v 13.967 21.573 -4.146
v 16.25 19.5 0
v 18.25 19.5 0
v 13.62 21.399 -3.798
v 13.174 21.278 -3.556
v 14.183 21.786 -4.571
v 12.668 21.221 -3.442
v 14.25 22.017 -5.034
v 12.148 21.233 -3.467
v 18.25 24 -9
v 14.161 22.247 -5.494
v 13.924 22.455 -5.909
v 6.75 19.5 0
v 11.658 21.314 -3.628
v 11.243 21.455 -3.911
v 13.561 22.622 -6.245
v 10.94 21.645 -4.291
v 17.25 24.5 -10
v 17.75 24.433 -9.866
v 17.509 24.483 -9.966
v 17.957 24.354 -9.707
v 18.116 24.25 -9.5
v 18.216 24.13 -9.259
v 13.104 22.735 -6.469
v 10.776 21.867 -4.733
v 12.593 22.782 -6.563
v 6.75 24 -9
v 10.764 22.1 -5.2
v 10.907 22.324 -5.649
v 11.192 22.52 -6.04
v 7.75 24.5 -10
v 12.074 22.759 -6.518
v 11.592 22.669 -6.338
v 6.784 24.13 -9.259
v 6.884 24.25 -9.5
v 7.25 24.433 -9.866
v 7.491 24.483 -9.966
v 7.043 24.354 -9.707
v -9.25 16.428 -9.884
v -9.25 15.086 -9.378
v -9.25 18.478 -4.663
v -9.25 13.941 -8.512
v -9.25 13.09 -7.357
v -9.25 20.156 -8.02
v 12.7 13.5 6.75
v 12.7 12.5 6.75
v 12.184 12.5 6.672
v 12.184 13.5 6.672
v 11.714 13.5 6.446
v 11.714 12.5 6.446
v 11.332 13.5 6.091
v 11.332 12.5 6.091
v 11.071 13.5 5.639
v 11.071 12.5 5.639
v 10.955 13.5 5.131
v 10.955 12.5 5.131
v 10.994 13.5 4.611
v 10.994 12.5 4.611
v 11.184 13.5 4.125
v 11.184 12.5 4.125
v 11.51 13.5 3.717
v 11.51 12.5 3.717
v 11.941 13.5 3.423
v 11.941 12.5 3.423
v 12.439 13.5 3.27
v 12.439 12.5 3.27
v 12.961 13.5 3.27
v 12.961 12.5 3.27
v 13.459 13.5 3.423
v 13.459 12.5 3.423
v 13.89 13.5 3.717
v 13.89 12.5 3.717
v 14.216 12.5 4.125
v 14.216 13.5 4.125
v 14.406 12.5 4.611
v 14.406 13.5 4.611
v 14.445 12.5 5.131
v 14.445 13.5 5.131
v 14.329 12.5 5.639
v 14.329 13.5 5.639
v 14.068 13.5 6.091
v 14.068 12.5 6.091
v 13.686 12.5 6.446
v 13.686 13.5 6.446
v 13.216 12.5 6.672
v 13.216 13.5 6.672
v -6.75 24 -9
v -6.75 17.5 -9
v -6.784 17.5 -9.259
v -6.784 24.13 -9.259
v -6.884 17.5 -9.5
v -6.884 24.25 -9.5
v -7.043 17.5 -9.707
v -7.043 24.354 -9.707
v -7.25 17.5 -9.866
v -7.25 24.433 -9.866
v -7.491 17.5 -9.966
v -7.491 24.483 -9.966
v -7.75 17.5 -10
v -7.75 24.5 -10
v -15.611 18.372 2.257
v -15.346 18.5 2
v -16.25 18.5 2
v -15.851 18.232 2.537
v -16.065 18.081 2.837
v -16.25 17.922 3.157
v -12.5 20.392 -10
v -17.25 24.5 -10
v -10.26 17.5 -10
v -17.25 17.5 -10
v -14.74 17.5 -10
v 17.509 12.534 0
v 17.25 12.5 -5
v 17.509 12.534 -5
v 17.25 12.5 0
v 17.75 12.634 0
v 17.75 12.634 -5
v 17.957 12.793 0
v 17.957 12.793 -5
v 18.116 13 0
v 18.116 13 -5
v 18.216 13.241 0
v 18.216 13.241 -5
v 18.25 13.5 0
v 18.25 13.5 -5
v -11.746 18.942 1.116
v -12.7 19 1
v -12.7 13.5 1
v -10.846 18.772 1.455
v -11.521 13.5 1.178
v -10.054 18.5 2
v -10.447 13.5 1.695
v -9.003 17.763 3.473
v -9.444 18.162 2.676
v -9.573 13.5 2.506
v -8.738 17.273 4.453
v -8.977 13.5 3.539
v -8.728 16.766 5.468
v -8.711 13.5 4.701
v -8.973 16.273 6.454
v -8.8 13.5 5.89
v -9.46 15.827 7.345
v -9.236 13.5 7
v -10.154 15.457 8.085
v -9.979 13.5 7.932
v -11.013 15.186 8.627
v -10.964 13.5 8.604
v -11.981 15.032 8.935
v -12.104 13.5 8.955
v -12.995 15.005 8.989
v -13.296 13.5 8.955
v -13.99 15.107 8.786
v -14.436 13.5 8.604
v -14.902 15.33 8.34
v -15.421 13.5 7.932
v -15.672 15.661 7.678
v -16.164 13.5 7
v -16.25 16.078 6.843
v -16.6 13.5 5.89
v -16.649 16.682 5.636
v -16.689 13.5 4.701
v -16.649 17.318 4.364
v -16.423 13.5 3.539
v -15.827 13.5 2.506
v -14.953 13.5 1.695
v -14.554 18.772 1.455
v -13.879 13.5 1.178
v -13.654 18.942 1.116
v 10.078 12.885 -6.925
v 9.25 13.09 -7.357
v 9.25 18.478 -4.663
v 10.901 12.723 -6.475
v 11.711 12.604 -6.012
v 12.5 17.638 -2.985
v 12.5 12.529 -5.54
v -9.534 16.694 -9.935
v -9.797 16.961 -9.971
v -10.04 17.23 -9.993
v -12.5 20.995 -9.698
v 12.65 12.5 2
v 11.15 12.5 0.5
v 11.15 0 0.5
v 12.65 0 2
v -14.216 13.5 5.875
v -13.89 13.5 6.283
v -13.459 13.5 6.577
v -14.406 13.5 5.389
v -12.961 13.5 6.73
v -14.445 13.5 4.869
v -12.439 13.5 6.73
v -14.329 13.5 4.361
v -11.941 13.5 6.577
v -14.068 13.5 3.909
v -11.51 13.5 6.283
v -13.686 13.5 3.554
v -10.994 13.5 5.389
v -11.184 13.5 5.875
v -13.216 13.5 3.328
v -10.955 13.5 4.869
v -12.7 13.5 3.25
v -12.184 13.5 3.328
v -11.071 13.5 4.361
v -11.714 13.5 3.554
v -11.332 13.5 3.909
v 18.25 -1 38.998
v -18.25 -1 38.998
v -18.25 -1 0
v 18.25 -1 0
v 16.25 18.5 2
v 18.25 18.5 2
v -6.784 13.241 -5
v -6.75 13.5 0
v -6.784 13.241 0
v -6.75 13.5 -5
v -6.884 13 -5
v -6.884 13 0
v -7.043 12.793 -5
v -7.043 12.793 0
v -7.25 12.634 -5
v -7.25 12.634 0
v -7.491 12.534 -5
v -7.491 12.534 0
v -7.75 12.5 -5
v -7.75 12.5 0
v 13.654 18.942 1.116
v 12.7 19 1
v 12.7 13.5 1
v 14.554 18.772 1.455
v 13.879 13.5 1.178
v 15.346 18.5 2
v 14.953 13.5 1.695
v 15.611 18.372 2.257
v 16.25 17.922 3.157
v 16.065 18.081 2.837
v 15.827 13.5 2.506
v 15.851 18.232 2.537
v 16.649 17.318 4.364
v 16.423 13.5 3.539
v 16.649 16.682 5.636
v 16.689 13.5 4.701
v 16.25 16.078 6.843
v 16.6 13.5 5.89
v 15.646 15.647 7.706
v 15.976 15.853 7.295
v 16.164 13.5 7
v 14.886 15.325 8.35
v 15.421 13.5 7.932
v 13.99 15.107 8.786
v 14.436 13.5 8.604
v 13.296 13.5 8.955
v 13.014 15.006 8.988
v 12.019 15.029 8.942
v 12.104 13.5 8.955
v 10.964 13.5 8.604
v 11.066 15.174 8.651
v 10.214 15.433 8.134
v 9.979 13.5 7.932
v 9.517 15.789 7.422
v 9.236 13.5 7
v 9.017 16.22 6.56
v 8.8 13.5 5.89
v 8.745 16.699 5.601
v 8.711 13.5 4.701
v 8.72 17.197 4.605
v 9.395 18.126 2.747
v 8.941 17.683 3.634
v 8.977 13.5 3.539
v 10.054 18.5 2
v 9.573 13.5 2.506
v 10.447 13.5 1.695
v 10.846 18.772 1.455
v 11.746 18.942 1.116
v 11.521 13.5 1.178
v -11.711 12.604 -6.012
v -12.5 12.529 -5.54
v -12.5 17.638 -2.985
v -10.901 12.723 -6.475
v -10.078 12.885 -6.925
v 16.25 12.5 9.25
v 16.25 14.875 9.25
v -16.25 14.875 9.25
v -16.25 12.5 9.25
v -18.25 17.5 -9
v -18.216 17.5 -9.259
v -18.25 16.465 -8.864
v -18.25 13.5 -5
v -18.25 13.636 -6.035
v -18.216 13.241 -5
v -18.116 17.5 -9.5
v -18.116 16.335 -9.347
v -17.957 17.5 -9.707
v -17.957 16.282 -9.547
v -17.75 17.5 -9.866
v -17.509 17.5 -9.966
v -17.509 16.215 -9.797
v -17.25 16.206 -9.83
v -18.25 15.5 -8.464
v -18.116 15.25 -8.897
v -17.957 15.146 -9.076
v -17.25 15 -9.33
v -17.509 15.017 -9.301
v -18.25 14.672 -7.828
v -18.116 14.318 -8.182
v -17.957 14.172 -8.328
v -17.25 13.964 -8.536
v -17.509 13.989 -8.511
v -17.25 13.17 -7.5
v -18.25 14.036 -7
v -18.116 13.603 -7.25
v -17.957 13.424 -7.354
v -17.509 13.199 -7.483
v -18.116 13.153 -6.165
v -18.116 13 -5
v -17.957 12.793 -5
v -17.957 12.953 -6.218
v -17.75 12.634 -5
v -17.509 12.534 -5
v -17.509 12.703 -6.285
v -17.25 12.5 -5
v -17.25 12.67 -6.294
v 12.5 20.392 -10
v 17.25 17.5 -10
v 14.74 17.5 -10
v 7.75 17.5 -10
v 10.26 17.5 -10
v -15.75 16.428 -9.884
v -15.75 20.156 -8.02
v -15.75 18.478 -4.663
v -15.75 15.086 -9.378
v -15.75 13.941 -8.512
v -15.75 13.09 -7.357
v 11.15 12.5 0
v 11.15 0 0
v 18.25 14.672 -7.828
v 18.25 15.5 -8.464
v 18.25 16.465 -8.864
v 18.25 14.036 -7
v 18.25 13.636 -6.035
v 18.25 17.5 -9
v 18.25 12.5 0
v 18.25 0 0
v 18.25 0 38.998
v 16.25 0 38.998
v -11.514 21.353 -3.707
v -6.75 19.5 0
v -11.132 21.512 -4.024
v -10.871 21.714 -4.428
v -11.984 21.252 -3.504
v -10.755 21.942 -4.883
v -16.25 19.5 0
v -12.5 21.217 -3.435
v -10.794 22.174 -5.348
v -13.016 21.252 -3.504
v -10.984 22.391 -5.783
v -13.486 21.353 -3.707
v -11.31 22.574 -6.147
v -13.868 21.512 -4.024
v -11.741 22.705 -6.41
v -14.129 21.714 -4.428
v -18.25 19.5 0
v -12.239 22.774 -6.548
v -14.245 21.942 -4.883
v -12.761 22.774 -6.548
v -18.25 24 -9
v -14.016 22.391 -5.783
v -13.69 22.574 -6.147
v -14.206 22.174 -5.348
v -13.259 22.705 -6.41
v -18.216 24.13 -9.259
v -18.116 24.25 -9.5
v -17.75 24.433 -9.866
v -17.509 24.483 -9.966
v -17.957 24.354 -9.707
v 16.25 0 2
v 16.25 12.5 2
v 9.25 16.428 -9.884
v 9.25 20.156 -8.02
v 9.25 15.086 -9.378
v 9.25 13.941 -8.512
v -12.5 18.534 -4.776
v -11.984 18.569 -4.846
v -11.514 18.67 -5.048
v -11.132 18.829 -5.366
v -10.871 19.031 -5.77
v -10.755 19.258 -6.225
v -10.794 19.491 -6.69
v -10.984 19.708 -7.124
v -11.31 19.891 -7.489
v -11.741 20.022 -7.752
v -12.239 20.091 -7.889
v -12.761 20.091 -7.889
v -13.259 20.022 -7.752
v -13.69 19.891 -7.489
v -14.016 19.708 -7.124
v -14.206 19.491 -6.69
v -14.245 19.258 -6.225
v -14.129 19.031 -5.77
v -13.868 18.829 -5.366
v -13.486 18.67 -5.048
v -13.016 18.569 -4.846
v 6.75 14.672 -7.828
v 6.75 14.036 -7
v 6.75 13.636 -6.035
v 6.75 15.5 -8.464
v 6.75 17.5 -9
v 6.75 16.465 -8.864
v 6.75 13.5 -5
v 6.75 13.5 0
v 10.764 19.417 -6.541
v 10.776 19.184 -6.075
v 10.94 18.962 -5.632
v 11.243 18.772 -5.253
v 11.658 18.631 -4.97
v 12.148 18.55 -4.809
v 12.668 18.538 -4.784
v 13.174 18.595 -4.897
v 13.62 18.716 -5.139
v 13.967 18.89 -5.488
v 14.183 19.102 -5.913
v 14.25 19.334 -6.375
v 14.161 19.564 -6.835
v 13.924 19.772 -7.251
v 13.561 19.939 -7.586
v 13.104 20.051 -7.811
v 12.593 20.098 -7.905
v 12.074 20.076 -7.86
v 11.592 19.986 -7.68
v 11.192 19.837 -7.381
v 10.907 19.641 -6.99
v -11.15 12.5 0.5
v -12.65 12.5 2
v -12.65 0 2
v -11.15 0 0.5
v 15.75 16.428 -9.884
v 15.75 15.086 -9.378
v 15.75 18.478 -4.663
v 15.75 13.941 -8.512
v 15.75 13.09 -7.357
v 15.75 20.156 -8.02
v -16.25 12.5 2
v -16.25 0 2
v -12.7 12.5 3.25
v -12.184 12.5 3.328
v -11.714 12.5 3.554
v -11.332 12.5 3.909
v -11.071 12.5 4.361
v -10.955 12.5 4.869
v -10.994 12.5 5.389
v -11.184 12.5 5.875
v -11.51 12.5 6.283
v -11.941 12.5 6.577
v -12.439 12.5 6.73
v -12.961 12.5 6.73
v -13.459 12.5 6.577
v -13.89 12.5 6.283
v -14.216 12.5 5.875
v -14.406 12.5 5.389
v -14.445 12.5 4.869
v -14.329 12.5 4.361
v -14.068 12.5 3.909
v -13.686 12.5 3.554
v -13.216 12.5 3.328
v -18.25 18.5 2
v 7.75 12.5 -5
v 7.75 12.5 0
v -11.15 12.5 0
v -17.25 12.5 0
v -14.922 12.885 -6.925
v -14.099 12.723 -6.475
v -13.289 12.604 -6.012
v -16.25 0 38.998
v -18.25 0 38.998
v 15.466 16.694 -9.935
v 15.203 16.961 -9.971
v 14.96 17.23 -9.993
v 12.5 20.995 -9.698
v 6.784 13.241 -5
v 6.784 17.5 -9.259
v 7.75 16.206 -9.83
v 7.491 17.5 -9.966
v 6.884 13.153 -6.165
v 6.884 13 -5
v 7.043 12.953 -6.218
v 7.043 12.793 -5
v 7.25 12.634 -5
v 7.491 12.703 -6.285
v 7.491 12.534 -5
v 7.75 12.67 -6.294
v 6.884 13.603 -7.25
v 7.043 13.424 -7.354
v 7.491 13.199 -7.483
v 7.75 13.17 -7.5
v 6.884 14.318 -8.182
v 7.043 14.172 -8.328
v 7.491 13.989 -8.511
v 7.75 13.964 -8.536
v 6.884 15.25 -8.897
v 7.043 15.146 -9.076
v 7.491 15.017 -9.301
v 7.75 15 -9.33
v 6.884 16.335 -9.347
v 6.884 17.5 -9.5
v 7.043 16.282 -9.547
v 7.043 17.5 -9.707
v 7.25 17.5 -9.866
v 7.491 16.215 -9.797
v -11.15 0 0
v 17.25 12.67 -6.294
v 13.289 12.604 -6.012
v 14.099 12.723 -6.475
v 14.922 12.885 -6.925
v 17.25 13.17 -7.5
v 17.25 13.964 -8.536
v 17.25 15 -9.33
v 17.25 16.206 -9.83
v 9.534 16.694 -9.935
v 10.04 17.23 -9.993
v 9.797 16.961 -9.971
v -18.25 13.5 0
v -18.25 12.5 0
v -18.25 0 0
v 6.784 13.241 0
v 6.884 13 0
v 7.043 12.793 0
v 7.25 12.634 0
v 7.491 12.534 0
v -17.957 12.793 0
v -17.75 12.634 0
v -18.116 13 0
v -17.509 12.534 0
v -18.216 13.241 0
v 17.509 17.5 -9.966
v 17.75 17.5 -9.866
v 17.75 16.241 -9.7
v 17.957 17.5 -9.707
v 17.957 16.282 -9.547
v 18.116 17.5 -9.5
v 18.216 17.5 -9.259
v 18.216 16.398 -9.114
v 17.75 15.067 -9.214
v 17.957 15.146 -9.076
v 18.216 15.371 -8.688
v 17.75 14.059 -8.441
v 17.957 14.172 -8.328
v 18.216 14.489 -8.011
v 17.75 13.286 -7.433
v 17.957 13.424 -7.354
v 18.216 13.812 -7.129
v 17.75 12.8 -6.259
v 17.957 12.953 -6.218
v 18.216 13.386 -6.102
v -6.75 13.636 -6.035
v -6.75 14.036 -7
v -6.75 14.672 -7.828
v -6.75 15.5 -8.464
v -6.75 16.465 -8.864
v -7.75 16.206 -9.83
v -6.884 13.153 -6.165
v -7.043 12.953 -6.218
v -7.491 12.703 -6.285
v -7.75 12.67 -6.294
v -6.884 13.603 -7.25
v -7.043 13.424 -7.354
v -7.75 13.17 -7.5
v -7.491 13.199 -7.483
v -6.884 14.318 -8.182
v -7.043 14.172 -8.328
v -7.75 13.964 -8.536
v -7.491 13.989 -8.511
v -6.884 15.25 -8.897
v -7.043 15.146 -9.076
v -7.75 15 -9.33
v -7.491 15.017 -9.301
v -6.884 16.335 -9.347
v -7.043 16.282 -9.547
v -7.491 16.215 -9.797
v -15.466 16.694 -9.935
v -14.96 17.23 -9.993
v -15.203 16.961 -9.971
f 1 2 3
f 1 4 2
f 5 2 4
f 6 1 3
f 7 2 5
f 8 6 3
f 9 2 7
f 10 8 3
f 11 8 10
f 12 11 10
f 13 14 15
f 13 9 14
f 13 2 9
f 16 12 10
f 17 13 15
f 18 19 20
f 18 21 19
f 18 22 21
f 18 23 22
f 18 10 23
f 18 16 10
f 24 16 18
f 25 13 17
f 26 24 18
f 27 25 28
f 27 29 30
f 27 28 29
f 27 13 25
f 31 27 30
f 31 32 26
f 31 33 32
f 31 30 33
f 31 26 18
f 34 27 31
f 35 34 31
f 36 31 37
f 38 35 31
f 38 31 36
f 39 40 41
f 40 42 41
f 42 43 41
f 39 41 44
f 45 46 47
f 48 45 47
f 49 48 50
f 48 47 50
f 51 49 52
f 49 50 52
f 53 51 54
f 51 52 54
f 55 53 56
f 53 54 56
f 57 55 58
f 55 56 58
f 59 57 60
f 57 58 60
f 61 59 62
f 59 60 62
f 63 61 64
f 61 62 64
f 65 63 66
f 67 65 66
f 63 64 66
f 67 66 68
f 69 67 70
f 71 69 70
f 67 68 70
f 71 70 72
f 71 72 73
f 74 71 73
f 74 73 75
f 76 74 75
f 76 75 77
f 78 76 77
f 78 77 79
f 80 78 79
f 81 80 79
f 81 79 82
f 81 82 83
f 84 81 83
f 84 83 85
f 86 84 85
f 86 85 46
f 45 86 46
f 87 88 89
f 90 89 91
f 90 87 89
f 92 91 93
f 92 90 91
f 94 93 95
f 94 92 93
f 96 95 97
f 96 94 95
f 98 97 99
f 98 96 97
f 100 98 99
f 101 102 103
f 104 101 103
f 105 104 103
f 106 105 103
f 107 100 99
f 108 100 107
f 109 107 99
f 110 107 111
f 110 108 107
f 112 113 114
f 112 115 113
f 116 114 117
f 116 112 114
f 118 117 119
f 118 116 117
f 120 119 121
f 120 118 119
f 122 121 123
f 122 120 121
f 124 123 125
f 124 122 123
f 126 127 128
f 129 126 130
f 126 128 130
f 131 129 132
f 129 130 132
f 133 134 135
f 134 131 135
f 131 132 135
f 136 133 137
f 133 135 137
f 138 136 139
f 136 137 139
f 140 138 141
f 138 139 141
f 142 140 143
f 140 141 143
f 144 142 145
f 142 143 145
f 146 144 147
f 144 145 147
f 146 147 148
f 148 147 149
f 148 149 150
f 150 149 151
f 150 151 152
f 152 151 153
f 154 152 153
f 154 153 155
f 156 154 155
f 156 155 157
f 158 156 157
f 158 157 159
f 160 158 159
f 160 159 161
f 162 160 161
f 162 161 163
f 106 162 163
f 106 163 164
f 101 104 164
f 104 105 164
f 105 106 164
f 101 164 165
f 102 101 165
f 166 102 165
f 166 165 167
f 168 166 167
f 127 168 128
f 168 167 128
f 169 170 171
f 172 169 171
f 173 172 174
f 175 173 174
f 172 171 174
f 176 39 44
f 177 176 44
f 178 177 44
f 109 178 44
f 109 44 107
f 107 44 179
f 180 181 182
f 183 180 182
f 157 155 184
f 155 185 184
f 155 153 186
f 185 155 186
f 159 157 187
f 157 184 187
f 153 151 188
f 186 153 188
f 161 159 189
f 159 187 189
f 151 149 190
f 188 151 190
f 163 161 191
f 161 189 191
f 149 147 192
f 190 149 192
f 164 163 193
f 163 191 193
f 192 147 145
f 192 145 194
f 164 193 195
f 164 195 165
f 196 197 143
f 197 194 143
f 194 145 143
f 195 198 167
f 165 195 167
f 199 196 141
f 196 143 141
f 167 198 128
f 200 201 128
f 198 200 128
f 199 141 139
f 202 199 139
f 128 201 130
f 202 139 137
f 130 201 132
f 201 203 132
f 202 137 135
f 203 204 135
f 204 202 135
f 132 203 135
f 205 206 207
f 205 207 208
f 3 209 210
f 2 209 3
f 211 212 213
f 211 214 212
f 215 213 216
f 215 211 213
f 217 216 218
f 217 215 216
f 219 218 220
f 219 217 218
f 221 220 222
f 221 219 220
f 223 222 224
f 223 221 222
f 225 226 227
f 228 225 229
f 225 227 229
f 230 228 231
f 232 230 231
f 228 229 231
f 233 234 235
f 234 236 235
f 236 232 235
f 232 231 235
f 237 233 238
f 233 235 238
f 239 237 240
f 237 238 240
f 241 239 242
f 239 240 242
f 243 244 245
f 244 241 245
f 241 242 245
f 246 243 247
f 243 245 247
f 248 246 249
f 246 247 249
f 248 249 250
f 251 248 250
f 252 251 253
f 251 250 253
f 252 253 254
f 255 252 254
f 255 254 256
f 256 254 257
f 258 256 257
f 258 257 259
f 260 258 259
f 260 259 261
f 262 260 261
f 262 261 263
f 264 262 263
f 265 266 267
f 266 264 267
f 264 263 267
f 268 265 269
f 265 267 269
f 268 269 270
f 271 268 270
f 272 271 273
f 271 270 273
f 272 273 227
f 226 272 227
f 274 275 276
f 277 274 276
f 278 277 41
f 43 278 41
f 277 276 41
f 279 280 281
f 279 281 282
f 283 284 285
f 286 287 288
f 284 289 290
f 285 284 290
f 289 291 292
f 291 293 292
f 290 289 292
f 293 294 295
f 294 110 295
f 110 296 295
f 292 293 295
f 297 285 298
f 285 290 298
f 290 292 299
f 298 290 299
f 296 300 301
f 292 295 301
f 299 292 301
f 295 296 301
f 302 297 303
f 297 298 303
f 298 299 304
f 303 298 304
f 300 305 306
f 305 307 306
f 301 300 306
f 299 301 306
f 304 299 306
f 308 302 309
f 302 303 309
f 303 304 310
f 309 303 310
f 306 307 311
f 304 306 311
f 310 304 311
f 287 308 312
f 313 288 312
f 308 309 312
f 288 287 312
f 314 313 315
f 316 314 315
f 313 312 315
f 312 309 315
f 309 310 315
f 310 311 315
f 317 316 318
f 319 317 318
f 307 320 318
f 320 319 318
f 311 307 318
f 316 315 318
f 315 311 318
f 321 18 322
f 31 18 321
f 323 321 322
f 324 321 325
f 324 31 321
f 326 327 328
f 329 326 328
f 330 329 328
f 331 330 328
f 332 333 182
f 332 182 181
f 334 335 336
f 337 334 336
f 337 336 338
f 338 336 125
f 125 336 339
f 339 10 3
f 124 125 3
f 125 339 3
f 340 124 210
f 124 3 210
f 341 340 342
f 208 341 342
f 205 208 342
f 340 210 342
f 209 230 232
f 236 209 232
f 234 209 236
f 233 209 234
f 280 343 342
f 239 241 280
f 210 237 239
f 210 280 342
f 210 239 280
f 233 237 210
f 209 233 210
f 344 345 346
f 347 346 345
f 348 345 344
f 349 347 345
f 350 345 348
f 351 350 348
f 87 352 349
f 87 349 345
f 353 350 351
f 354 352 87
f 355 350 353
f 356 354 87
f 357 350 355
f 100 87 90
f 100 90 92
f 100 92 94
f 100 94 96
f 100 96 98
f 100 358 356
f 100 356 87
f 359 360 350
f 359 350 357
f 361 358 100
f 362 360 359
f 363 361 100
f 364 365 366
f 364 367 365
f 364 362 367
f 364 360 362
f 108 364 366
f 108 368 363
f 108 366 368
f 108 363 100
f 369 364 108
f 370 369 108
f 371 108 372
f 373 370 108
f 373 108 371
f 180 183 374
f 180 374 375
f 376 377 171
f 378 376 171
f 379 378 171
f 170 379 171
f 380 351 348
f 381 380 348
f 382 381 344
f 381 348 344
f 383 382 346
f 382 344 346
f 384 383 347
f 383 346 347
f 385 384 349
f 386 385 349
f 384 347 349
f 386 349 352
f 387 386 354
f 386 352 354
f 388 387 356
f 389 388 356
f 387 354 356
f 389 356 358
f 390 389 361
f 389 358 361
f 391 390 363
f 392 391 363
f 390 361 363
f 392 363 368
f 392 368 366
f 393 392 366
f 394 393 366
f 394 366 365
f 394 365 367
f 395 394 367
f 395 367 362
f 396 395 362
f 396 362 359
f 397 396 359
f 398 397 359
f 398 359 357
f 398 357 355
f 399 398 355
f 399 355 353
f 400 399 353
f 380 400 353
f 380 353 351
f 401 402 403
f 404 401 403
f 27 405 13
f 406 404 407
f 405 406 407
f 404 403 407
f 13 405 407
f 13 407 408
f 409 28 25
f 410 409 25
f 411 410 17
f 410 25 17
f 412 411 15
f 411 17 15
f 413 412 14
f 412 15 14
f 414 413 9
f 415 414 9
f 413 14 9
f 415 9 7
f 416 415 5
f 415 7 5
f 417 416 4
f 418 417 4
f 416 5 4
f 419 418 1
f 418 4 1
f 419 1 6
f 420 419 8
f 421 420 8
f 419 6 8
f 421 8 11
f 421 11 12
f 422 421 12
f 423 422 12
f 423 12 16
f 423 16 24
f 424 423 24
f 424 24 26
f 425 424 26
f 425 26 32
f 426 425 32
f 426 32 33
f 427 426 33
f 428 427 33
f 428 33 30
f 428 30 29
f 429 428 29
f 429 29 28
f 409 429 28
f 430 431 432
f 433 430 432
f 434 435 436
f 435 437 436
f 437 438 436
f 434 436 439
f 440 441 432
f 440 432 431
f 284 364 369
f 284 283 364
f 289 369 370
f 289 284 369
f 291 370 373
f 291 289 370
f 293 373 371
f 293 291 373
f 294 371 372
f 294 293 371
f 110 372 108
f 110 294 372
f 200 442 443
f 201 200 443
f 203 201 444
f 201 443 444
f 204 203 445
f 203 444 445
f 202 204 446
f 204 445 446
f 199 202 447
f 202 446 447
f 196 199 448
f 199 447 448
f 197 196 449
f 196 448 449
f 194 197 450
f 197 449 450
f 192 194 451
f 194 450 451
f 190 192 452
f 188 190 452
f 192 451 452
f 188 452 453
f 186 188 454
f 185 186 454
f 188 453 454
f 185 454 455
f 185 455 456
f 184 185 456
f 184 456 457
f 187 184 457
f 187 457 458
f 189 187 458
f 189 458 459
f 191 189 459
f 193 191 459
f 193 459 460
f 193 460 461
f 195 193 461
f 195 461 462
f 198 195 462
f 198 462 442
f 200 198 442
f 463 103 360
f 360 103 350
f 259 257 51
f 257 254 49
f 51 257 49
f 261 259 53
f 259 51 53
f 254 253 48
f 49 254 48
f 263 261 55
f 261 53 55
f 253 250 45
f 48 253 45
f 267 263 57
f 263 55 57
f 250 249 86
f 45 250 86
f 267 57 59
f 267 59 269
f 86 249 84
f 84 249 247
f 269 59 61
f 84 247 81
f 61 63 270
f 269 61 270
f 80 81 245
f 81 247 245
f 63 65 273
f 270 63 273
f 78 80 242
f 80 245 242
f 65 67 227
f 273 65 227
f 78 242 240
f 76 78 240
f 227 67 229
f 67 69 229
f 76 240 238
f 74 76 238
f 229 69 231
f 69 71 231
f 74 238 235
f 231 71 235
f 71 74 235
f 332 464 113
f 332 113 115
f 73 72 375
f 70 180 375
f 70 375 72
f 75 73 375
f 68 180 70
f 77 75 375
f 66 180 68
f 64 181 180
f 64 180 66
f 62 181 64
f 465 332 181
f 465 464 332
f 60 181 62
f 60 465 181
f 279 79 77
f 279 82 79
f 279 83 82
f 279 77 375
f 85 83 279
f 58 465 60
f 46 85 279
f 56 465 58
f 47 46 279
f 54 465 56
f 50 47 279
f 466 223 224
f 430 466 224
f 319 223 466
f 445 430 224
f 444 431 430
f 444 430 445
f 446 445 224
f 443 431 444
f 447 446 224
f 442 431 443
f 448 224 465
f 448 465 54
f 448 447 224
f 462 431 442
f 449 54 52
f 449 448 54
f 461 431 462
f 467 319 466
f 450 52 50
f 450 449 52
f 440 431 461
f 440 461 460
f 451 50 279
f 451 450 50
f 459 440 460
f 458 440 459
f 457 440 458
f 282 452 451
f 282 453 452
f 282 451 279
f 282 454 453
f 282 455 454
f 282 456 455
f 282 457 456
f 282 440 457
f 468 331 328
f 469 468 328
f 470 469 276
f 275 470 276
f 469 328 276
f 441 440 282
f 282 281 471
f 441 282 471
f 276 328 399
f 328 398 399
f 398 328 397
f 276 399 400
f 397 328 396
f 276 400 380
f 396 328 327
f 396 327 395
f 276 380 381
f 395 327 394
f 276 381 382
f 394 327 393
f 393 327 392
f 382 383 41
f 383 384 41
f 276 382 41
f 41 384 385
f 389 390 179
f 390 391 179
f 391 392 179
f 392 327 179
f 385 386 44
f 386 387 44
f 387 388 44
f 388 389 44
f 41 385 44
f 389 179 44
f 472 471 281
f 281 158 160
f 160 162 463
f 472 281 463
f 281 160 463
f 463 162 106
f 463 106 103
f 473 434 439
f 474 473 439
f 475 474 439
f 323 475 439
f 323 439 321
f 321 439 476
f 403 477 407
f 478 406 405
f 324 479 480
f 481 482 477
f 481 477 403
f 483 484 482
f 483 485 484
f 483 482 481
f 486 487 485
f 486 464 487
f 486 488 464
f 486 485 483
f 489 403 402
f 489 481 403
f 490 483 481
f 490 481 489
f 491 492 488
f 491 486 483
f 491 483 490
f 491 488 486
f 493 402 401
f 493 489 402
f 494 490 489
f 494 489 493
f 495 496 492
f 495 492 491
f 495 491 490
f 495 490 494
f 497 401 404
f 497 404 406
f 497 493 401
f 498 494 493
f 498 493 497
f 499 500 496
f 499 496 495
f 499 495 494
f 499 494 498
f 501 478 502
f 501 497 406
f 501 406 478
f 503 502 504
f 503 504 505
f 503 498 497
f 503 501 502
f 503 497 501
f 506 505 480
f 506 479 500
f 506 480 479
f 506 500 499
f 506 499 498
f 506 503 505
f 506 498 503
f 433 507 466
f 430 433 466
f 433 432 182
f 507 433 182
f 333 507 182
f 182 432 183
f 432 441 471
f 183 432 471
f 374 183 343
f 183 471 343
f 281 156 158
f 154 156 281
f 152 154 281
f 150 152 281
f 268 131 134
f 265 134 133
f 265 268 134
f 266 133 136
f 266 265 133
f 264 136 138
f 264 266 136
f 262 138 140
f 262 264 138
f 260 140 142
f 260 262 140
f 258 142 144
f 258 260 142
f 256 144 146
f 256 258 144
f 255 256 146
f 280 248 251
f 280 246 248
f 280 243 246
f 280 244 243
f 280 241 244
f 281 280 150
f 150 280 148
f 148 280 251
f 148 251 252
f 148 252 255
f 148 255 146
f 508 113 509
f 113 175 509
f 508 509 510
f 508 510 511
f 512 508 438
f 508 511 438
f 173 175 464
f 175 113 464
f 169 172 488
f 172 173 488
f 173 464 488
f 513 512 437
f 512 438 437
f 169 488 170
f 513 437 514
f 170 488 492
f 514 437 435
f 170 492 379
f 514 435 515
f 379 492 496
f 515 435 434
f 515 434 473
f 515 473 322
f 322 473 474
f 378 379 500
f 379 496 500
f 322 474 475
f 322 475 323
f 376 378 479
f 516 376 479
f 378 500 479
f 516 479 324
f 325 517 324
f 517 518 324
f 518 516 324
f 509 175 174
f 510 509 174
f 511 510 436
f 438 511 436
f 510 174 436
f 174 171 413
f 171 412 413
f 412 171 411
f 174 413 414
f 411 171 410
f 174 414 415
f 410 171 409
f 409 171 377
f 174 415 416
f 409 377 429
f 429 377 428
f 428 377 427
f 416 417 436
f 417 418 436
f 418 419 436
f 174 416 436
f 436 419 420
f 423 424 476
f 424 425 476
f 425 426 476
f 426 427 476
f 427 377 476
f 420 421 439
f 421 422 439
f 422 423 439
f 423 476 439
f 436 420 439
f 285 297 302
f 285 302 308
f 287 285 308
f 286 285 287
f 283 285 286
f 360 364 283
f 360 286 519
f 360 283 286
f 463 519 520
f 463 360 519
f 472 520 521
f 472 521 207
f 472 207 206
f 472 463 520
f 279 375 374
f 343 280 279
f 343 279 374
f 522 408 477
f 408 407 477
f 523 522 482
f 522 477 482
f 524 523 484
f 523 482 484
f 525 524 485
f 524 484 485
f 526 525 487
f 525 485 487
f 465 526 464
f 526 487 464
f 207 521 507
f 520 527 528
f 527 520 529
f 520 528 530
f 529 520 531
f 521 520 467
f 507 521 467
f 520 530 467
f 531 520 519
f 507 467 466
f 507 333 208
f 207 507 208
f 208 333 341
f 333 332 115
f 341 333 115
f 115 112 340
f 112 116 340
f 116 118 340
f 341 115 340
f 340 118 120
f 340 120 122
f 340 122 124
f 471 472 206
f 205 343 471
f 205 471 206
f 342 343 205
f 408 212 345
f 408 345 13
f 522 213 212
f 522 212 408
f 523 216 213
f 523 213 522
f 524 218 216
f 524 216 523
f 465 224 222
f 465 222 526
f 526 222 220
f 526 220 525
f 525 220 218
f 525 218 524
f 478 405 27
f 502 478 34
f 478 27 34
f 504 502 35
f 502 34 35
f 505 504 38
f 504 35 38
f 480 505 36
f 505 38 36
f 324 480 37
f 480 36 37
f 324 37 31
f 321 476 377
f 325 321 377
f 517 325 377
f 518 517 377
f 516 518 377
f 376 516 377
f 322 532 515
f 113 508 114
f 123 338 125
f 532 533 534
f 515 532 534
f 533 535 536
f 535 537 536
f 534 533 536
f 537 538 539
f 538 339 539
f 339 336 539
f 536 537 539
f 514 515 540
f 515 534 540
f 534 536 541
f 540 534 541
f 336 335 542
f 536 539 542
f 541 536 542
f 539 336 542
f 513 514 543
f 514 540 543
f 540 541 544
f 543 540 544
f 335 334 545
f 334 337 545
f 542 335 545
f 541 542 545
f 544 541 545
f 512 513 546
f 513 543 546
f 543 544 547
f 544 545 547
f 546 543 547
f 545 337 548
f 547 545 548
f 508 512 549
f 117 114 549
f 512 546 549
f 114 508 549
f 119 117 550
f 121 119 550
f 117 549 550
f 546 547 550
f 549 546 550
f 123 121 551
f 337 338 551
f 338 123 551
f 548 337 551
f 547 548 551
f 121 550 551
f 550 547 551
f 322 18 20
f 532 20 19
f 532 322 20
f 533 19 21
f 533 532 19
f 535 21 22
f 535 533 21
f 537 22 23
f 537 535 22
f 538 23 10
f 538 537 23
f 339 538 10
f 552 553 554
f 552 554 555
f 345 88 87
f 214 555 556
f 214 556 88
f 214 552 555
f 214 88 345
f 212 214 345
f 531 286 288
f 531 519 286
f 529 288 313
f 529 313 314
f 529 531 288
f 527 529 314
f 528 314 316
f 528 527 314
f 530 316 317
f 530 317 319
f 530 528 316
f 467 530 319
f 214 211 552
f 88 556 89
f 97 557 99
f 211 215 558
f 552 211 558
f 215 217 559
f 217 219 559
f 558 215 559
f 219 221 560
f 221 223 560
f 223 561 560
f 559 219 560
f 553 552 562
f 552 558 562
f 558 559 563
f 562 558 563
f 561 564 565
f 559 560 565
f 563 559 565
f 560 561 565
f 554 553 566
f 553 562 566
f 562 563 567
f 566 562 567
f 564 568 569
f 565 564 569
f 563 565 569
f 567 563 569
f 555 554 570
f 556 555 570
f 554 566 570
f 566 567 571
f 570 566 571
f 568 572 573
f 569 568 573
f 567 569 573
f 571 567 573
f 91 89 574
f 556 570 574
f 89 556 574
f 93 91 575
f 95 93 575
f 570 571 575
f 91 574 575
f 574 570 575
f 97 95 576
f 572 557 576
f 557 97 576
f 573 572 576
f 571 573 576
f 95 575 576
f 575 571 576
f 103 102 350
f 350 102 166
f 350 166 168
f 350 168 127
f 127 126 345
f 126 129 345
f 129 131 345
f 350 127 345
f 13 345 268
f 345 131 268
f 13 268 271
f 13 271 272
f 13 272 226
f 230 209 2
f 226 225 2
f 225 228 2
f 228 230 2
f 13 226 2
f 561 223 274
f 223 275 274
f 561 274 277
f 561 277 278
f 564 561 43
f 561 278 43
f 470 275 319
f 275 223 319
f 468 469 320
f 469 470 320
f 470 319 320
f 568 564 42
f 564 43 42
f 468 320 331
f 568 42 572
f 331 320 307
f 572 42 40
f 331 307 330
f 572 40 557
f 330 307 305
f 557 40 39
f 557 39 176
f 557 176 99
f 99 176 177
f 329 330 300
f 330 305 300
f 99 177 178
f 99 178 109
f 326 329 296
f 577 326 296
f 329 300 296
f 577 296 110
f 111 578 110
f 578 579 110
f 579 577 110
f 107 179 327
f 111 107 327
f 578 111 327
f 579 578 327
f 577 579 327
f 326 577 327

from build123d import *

# Parameters (mm, degrees)
BOSS_EXTRUDE1_DEPTH             = 16.25
CUT_EXTRUDE7_DEPTH              = 47.531565279
CUT_EXTRUDE7_DEPTH_BACK         = 47.531565279
SKETCH2_W                       = 22.3
SKETCH2_H                       = 12.5
CUT_EXTRUDE1_DEPTH              = 26.461981463
BOSS_EXTRUDE2_DEPTH             = 2
BOSS_EXTRUDE4_REACH             = 49.267
BOSS_EXTRUDE4_DIRECTION_2_REACH = 49.267
SKETCH12_R                      = 1.75
CUT_EXTRUDE8_DEPTH              = 45.835104186
CUT_EXTRUDE10_START             = -1
SKETCH14_R                      = 4
CUT_EXTRUDE10_DEPTH             = 44.835104186
SKETCH15_W                      = 36.5
SKETCH15_H                      = 38.998385445
BOSS_EXTRUDE5_DEPTH             = 1
BOSS_EXTRUDE6_DEPTH             = 36.5
SKETCH18_W                      = 13.5
SKETCH18_H                      = 10
CUT_EXTRUDE12_DEPTH             = 46.124124006
SKETCH21_R                      = 1.75
CUT_EXTRUDE15_DEPTH             = 40.773623022
CUT_EXTRUDE16_START             = -3
CUT_EXTRUDE16_DEPTH             = 37.773623022
CHAMFER1_SIZE                   = 1.5
FILLET1_R                       = 5
FILLET2_R                       = 1


with BuildPart() as part:
    # Sketch1 → Boss-Extrude1 (new, symmetric)
    with BuildSketch(Plane(origin=(0, 0, 0), x_dir=(0, 0, -1), z_dir=(1, 0, 0))):
        Polygon((0, 19.5), (0, 0), (-38.998385445, 0), align=None)
    extrude(amount=BOSS_EXTRUDE1_DEPTH, both=True)

    # Sketch10 → Cut-Extrude7 (cut, two sides: drawn at the far end of the back side and taken through both)
    with BuildSketch(Plane(origin=(0, 0, 0), x_dir=(0, 0, -1), z_dir=(1, 0, 0)).offset(-CUT_EXTRUDE7_DEPTH_BACK)):
        Polygon((-2, 0), (-2, 18.499958599), (-38.998385445, 0), align=None)
    extrude(amount=CUT_EXTRUDE7_DEPTH + CUT_EXTRUDE7_DEPTH_BACK, mode=Mode.SUBTRACT)

    # Sketch2 → Cut-Extrude1 (cut, through all)
    with BuildSketch(Plane.XY):
        with Locations((0, 6.25)):
            Rectangle(SKETCH2_W, SKETCH2_H)
    extrude(amount=CUT_EXTRUDE1_DEPTH, mode=Mode.SUBTRACT)

    # Sketch6 → Boss-Extrude2 (add)
    with BuildSketch(Plane(origin=(-16.25, 0, 0), x_dir=(0, 0, -1), z_dir=(1, 0, 0))):
        Polygon((-2, 0), (-38.998385445, 0), (-2, 18.499958599), (0, 19.5), (0, 0), align=None)
    boss_extrude2 = extrude(amount=-BOSS_EXTRUDE2_DEPTH)

    # Mirror1: Boss-Extrude2 across plane
    add(boss_extrude2.mirror(Plane(origin=(0, 0, 0), x_dir=(0, 0, 1), z_dir=(1, 0, 0))))

    # Boss-Extrude4: up to this face of the body (flat: up to its plane)
    boss_extrude4_end = Plane(part.part.faces().sort_by_distance((16.25, 6.166652866, 14.332795148))[0])
    # Sketch11 → Boss-Extrude4 (add, up to the picked face)
    with BuildSketch(Plane(origin=(0, 0, 0), x_dir=(0, 0, -1), z_dir=(1, 0, 0)), mode=Mode.PRIVATE) as boss_extrude4_sk1:
        Polygon((-2, 18.499958599), (-9.25, 14.874808522), (-9.25, 12.5), (-2, 12.5), align=None)
    boss_extrude4_tool1 = split(extrude(boss_extrude4_sk1.sketch, amount=BOSS_EXTRUDE4_REACH, mode=Mode.PRIVATE), bisect_by=boss_extrude4_end, keep=Keep.BOTH, mode=Mode.PRIVATE)
    add(boss_extrude4_tool1.solids().sort_by(Axis((0, 14.724459, 5.101954), (1, 0, 0)))[0])

    # Boss-Extrude4 direction 2: up to this face of the body (flat: up to its plane)
    boss_extrude4_direction_2_end = Plane(part.part.faces().sort_by_distance((-16.25, 6.166652866, 14.332795148))[0])
    # Sketch11 → Boss-Extrude4 direction 2 (add, up to the picked face)
    with BuildSketch(Plane(origin=(0, 0, 0), x_dir=(0, 0, -1), z_dir=(1, 0, 0)), mode=Mode.PRIVATE) as boss_extrude4_direction_2_sk1:
        Polygon((-2, 18.499958599), (-9.25, 14.874808522), (-9.25, 12.5), (-2, 12.5), align=None)
    boss_extrude4_direction_2_tool1 = split(extrude(boss_extrude4_direction_2_sk1.sketch, amount=-BOSS_EXTRUDE4_DIRECTION_2_REACH, mode=Mode.PRIVATE), bisect_by=boss_extrude4_direction_2_end, keep=Keep.BOTH, mode=Mode.PRIVATE)
    add(boss_extrude4_direction_2_tool1.solids().sort_by(Axis((0, 14.724459, 5.101954), (-1, 0, 0)))[0])

    # Sketch12 → Cut-Extrude8 (cut, through all)
    with BuildSketch(Plane.XZ.offset(-12.5)):
        with Locations(Location((-12.7, 5, 0), (0, 0, 270))):
            Circle(SKETCH12_R)
        with Locations(Location((12.7, 5, 0), (0, 0, 90))):
            Circle(SKETCH12_R)
    extrude(amount=-CUT_EXTRUDE8_DEPTH, mode=Mode.SUBTRACT)

    # Sketch14 → Cut-Extrude10 (cut, through all)
    with BuildSketch(Plane.XZ.offset(-12.5).offset(CUT_EXTRUDE10_START)):
        with Locations(Location((-12.7, 5, 0), (0, 0, 270))):
            Circle(SKETCH14_R)
        with Locations(Location((12.7, 5, 0), (0, 0, 270))):
            Circle(SKETCH14_R)
    extrude(amount=-CUT_EXTRUDE10_DEPTH, mode=Mode.SUBTRACT)

    # Sketch15 → Boss-Extrude5 (add)
    with BuildSketch(Plane.XZ):
        with Locations((0, 19.499192723)):
            Rectangle(SKETCH15_W, SKETCH15_H)
    extrude(amount=BOSS_EXTRUDE5_DEPTH)

    # Sketch17 → Boss-Extrude6 (add)
    with BuildSketch(Plane.ZY.offset(18.25)):
        Polygon((0, 19.5), (-10, 24.500207003), (-10, 12.5), (0, 12.5), align=None)
    extrude(amount=-BOSS_EXTRUDE6_DEPTH)

    # Sketch18 → Cut-Extrude12 (cut, through all)
    with BuildSketch(Plane.XZ.offset(-12.5)):
        with Locations((0, -5)):
            Rectangle(SKETCH18_W, SKETCH18_H)
    extrude(amount=-CUT_EXTRUDE12_DEPTH, mode=Mode.SUBTRACT)

    # Sketch21 → Cut-Extrude15 (cut, through all)
    with BuildSketch(Plane(origin=(0, 15.599741659, 7.800193749), x_dir=(1, 0, 0), z_dir=(0, 0.8944197849825609, 0.44722840722806245))):
        with Locations(Location((-12.5, 14.311170173, 0), (0, 0, 270))):
            Circle(SKETCH21_R)
        with Locations(Location((12.5, 14.311170173, 0), (0, 0, 172.6663404))):
            Circle(SKETCH21_R)
    extrude(amount=-CUT_EXTRUDE15_DEPTH, mode=Mode.SUBTRACT)

    # Sketch22 → Cut-Extrude16 (cut, through all)
    with BuildSketch(Plane(origin=(0, 15.599741659, 7.800193749), x_dir=(1, 0, 0), z_dir=(0, 0.8944197849825609, 0.44722840722806245)).offset(CUT_EXTRUDE16_START)):
        Polygon((12.5, 18.063946922), (9.25, 16.187558548), (9.25, 12.434781798), (12.5, 10.558393423), (15.75, 12.434781798), (15.75, 16.187558548), align=None)
        Polygon((-12.5, 18.063946922), (-15.75, 16.187558548), (-15.75, 12.434781798), (-12.5, 10.558393423), (-9.25, 12.434781798), (-9.25, 16.187558548), align=None)
    extrude(amount=-CUT_EXTRUDE16_DEPTH, mode=Mode.SUBTRACT)

    # Chamfer1
    chamfer1_edges = [part.edges().sort_by_distance(p)[0] for p in [
        (11.15, 6.25, 2),
        (-11.15, 6.25, 2),
    ]]
    chamfer(chamfer1_edges, length=CHAMFER1_SIZE)

    # Fillet1
    # the kernel refuses this fillet: 5 mm, written as the material it takes off along each edge
    with BuildSketch(Plane(origin=(-21.75, 12.5, -10), x_dir=(0, 0, 1), z_dir=(1, 0, 0)), Plane(origin=(3.25, 12.5, -10), x_dir=(0, 0, 1), z_dir=(1, 0, 0))) as fillet1_piece_1:
        with BuildLine():
            CenterArc((FILLET1_R, -FILLET1_R), FILLET1_R, 90, 90)
            Line((0, -FILLET1_R), (0, 0))
            Line((0, 0), (FILLET1_R, 0))
        make_face()
    extrude(amount=27.5, mode=Mode.SUBTRACT)

    # Fillet2
    fillet2_edges = [part.edges().sort_by_distance(p)[0] for p in [
        (-18.25, 21.000103501, -10),
        (18.25, 12.5, -2.5),
        (-6.75, 21.000103501, -10),
        (6.75, 21.000103501, -10),
        (-6.75, 12.5, -2.5),
        (-18.25, 12.5, -2.5),
        (-18.25, 13.964466094, -8.535533906),
        (6.75, 12.5, -2.5),
        (-6.75, 13.964466094, -8.535533906),
        (18.25, 21.000103501, -10),
        (6.75, 13.964466094, -8.535533906),
        (18.25, 13.964466094, -8.535533906),
    ]]
    fillet(fillet2_edges, radius=FILLET2_R)


solid = part.part
